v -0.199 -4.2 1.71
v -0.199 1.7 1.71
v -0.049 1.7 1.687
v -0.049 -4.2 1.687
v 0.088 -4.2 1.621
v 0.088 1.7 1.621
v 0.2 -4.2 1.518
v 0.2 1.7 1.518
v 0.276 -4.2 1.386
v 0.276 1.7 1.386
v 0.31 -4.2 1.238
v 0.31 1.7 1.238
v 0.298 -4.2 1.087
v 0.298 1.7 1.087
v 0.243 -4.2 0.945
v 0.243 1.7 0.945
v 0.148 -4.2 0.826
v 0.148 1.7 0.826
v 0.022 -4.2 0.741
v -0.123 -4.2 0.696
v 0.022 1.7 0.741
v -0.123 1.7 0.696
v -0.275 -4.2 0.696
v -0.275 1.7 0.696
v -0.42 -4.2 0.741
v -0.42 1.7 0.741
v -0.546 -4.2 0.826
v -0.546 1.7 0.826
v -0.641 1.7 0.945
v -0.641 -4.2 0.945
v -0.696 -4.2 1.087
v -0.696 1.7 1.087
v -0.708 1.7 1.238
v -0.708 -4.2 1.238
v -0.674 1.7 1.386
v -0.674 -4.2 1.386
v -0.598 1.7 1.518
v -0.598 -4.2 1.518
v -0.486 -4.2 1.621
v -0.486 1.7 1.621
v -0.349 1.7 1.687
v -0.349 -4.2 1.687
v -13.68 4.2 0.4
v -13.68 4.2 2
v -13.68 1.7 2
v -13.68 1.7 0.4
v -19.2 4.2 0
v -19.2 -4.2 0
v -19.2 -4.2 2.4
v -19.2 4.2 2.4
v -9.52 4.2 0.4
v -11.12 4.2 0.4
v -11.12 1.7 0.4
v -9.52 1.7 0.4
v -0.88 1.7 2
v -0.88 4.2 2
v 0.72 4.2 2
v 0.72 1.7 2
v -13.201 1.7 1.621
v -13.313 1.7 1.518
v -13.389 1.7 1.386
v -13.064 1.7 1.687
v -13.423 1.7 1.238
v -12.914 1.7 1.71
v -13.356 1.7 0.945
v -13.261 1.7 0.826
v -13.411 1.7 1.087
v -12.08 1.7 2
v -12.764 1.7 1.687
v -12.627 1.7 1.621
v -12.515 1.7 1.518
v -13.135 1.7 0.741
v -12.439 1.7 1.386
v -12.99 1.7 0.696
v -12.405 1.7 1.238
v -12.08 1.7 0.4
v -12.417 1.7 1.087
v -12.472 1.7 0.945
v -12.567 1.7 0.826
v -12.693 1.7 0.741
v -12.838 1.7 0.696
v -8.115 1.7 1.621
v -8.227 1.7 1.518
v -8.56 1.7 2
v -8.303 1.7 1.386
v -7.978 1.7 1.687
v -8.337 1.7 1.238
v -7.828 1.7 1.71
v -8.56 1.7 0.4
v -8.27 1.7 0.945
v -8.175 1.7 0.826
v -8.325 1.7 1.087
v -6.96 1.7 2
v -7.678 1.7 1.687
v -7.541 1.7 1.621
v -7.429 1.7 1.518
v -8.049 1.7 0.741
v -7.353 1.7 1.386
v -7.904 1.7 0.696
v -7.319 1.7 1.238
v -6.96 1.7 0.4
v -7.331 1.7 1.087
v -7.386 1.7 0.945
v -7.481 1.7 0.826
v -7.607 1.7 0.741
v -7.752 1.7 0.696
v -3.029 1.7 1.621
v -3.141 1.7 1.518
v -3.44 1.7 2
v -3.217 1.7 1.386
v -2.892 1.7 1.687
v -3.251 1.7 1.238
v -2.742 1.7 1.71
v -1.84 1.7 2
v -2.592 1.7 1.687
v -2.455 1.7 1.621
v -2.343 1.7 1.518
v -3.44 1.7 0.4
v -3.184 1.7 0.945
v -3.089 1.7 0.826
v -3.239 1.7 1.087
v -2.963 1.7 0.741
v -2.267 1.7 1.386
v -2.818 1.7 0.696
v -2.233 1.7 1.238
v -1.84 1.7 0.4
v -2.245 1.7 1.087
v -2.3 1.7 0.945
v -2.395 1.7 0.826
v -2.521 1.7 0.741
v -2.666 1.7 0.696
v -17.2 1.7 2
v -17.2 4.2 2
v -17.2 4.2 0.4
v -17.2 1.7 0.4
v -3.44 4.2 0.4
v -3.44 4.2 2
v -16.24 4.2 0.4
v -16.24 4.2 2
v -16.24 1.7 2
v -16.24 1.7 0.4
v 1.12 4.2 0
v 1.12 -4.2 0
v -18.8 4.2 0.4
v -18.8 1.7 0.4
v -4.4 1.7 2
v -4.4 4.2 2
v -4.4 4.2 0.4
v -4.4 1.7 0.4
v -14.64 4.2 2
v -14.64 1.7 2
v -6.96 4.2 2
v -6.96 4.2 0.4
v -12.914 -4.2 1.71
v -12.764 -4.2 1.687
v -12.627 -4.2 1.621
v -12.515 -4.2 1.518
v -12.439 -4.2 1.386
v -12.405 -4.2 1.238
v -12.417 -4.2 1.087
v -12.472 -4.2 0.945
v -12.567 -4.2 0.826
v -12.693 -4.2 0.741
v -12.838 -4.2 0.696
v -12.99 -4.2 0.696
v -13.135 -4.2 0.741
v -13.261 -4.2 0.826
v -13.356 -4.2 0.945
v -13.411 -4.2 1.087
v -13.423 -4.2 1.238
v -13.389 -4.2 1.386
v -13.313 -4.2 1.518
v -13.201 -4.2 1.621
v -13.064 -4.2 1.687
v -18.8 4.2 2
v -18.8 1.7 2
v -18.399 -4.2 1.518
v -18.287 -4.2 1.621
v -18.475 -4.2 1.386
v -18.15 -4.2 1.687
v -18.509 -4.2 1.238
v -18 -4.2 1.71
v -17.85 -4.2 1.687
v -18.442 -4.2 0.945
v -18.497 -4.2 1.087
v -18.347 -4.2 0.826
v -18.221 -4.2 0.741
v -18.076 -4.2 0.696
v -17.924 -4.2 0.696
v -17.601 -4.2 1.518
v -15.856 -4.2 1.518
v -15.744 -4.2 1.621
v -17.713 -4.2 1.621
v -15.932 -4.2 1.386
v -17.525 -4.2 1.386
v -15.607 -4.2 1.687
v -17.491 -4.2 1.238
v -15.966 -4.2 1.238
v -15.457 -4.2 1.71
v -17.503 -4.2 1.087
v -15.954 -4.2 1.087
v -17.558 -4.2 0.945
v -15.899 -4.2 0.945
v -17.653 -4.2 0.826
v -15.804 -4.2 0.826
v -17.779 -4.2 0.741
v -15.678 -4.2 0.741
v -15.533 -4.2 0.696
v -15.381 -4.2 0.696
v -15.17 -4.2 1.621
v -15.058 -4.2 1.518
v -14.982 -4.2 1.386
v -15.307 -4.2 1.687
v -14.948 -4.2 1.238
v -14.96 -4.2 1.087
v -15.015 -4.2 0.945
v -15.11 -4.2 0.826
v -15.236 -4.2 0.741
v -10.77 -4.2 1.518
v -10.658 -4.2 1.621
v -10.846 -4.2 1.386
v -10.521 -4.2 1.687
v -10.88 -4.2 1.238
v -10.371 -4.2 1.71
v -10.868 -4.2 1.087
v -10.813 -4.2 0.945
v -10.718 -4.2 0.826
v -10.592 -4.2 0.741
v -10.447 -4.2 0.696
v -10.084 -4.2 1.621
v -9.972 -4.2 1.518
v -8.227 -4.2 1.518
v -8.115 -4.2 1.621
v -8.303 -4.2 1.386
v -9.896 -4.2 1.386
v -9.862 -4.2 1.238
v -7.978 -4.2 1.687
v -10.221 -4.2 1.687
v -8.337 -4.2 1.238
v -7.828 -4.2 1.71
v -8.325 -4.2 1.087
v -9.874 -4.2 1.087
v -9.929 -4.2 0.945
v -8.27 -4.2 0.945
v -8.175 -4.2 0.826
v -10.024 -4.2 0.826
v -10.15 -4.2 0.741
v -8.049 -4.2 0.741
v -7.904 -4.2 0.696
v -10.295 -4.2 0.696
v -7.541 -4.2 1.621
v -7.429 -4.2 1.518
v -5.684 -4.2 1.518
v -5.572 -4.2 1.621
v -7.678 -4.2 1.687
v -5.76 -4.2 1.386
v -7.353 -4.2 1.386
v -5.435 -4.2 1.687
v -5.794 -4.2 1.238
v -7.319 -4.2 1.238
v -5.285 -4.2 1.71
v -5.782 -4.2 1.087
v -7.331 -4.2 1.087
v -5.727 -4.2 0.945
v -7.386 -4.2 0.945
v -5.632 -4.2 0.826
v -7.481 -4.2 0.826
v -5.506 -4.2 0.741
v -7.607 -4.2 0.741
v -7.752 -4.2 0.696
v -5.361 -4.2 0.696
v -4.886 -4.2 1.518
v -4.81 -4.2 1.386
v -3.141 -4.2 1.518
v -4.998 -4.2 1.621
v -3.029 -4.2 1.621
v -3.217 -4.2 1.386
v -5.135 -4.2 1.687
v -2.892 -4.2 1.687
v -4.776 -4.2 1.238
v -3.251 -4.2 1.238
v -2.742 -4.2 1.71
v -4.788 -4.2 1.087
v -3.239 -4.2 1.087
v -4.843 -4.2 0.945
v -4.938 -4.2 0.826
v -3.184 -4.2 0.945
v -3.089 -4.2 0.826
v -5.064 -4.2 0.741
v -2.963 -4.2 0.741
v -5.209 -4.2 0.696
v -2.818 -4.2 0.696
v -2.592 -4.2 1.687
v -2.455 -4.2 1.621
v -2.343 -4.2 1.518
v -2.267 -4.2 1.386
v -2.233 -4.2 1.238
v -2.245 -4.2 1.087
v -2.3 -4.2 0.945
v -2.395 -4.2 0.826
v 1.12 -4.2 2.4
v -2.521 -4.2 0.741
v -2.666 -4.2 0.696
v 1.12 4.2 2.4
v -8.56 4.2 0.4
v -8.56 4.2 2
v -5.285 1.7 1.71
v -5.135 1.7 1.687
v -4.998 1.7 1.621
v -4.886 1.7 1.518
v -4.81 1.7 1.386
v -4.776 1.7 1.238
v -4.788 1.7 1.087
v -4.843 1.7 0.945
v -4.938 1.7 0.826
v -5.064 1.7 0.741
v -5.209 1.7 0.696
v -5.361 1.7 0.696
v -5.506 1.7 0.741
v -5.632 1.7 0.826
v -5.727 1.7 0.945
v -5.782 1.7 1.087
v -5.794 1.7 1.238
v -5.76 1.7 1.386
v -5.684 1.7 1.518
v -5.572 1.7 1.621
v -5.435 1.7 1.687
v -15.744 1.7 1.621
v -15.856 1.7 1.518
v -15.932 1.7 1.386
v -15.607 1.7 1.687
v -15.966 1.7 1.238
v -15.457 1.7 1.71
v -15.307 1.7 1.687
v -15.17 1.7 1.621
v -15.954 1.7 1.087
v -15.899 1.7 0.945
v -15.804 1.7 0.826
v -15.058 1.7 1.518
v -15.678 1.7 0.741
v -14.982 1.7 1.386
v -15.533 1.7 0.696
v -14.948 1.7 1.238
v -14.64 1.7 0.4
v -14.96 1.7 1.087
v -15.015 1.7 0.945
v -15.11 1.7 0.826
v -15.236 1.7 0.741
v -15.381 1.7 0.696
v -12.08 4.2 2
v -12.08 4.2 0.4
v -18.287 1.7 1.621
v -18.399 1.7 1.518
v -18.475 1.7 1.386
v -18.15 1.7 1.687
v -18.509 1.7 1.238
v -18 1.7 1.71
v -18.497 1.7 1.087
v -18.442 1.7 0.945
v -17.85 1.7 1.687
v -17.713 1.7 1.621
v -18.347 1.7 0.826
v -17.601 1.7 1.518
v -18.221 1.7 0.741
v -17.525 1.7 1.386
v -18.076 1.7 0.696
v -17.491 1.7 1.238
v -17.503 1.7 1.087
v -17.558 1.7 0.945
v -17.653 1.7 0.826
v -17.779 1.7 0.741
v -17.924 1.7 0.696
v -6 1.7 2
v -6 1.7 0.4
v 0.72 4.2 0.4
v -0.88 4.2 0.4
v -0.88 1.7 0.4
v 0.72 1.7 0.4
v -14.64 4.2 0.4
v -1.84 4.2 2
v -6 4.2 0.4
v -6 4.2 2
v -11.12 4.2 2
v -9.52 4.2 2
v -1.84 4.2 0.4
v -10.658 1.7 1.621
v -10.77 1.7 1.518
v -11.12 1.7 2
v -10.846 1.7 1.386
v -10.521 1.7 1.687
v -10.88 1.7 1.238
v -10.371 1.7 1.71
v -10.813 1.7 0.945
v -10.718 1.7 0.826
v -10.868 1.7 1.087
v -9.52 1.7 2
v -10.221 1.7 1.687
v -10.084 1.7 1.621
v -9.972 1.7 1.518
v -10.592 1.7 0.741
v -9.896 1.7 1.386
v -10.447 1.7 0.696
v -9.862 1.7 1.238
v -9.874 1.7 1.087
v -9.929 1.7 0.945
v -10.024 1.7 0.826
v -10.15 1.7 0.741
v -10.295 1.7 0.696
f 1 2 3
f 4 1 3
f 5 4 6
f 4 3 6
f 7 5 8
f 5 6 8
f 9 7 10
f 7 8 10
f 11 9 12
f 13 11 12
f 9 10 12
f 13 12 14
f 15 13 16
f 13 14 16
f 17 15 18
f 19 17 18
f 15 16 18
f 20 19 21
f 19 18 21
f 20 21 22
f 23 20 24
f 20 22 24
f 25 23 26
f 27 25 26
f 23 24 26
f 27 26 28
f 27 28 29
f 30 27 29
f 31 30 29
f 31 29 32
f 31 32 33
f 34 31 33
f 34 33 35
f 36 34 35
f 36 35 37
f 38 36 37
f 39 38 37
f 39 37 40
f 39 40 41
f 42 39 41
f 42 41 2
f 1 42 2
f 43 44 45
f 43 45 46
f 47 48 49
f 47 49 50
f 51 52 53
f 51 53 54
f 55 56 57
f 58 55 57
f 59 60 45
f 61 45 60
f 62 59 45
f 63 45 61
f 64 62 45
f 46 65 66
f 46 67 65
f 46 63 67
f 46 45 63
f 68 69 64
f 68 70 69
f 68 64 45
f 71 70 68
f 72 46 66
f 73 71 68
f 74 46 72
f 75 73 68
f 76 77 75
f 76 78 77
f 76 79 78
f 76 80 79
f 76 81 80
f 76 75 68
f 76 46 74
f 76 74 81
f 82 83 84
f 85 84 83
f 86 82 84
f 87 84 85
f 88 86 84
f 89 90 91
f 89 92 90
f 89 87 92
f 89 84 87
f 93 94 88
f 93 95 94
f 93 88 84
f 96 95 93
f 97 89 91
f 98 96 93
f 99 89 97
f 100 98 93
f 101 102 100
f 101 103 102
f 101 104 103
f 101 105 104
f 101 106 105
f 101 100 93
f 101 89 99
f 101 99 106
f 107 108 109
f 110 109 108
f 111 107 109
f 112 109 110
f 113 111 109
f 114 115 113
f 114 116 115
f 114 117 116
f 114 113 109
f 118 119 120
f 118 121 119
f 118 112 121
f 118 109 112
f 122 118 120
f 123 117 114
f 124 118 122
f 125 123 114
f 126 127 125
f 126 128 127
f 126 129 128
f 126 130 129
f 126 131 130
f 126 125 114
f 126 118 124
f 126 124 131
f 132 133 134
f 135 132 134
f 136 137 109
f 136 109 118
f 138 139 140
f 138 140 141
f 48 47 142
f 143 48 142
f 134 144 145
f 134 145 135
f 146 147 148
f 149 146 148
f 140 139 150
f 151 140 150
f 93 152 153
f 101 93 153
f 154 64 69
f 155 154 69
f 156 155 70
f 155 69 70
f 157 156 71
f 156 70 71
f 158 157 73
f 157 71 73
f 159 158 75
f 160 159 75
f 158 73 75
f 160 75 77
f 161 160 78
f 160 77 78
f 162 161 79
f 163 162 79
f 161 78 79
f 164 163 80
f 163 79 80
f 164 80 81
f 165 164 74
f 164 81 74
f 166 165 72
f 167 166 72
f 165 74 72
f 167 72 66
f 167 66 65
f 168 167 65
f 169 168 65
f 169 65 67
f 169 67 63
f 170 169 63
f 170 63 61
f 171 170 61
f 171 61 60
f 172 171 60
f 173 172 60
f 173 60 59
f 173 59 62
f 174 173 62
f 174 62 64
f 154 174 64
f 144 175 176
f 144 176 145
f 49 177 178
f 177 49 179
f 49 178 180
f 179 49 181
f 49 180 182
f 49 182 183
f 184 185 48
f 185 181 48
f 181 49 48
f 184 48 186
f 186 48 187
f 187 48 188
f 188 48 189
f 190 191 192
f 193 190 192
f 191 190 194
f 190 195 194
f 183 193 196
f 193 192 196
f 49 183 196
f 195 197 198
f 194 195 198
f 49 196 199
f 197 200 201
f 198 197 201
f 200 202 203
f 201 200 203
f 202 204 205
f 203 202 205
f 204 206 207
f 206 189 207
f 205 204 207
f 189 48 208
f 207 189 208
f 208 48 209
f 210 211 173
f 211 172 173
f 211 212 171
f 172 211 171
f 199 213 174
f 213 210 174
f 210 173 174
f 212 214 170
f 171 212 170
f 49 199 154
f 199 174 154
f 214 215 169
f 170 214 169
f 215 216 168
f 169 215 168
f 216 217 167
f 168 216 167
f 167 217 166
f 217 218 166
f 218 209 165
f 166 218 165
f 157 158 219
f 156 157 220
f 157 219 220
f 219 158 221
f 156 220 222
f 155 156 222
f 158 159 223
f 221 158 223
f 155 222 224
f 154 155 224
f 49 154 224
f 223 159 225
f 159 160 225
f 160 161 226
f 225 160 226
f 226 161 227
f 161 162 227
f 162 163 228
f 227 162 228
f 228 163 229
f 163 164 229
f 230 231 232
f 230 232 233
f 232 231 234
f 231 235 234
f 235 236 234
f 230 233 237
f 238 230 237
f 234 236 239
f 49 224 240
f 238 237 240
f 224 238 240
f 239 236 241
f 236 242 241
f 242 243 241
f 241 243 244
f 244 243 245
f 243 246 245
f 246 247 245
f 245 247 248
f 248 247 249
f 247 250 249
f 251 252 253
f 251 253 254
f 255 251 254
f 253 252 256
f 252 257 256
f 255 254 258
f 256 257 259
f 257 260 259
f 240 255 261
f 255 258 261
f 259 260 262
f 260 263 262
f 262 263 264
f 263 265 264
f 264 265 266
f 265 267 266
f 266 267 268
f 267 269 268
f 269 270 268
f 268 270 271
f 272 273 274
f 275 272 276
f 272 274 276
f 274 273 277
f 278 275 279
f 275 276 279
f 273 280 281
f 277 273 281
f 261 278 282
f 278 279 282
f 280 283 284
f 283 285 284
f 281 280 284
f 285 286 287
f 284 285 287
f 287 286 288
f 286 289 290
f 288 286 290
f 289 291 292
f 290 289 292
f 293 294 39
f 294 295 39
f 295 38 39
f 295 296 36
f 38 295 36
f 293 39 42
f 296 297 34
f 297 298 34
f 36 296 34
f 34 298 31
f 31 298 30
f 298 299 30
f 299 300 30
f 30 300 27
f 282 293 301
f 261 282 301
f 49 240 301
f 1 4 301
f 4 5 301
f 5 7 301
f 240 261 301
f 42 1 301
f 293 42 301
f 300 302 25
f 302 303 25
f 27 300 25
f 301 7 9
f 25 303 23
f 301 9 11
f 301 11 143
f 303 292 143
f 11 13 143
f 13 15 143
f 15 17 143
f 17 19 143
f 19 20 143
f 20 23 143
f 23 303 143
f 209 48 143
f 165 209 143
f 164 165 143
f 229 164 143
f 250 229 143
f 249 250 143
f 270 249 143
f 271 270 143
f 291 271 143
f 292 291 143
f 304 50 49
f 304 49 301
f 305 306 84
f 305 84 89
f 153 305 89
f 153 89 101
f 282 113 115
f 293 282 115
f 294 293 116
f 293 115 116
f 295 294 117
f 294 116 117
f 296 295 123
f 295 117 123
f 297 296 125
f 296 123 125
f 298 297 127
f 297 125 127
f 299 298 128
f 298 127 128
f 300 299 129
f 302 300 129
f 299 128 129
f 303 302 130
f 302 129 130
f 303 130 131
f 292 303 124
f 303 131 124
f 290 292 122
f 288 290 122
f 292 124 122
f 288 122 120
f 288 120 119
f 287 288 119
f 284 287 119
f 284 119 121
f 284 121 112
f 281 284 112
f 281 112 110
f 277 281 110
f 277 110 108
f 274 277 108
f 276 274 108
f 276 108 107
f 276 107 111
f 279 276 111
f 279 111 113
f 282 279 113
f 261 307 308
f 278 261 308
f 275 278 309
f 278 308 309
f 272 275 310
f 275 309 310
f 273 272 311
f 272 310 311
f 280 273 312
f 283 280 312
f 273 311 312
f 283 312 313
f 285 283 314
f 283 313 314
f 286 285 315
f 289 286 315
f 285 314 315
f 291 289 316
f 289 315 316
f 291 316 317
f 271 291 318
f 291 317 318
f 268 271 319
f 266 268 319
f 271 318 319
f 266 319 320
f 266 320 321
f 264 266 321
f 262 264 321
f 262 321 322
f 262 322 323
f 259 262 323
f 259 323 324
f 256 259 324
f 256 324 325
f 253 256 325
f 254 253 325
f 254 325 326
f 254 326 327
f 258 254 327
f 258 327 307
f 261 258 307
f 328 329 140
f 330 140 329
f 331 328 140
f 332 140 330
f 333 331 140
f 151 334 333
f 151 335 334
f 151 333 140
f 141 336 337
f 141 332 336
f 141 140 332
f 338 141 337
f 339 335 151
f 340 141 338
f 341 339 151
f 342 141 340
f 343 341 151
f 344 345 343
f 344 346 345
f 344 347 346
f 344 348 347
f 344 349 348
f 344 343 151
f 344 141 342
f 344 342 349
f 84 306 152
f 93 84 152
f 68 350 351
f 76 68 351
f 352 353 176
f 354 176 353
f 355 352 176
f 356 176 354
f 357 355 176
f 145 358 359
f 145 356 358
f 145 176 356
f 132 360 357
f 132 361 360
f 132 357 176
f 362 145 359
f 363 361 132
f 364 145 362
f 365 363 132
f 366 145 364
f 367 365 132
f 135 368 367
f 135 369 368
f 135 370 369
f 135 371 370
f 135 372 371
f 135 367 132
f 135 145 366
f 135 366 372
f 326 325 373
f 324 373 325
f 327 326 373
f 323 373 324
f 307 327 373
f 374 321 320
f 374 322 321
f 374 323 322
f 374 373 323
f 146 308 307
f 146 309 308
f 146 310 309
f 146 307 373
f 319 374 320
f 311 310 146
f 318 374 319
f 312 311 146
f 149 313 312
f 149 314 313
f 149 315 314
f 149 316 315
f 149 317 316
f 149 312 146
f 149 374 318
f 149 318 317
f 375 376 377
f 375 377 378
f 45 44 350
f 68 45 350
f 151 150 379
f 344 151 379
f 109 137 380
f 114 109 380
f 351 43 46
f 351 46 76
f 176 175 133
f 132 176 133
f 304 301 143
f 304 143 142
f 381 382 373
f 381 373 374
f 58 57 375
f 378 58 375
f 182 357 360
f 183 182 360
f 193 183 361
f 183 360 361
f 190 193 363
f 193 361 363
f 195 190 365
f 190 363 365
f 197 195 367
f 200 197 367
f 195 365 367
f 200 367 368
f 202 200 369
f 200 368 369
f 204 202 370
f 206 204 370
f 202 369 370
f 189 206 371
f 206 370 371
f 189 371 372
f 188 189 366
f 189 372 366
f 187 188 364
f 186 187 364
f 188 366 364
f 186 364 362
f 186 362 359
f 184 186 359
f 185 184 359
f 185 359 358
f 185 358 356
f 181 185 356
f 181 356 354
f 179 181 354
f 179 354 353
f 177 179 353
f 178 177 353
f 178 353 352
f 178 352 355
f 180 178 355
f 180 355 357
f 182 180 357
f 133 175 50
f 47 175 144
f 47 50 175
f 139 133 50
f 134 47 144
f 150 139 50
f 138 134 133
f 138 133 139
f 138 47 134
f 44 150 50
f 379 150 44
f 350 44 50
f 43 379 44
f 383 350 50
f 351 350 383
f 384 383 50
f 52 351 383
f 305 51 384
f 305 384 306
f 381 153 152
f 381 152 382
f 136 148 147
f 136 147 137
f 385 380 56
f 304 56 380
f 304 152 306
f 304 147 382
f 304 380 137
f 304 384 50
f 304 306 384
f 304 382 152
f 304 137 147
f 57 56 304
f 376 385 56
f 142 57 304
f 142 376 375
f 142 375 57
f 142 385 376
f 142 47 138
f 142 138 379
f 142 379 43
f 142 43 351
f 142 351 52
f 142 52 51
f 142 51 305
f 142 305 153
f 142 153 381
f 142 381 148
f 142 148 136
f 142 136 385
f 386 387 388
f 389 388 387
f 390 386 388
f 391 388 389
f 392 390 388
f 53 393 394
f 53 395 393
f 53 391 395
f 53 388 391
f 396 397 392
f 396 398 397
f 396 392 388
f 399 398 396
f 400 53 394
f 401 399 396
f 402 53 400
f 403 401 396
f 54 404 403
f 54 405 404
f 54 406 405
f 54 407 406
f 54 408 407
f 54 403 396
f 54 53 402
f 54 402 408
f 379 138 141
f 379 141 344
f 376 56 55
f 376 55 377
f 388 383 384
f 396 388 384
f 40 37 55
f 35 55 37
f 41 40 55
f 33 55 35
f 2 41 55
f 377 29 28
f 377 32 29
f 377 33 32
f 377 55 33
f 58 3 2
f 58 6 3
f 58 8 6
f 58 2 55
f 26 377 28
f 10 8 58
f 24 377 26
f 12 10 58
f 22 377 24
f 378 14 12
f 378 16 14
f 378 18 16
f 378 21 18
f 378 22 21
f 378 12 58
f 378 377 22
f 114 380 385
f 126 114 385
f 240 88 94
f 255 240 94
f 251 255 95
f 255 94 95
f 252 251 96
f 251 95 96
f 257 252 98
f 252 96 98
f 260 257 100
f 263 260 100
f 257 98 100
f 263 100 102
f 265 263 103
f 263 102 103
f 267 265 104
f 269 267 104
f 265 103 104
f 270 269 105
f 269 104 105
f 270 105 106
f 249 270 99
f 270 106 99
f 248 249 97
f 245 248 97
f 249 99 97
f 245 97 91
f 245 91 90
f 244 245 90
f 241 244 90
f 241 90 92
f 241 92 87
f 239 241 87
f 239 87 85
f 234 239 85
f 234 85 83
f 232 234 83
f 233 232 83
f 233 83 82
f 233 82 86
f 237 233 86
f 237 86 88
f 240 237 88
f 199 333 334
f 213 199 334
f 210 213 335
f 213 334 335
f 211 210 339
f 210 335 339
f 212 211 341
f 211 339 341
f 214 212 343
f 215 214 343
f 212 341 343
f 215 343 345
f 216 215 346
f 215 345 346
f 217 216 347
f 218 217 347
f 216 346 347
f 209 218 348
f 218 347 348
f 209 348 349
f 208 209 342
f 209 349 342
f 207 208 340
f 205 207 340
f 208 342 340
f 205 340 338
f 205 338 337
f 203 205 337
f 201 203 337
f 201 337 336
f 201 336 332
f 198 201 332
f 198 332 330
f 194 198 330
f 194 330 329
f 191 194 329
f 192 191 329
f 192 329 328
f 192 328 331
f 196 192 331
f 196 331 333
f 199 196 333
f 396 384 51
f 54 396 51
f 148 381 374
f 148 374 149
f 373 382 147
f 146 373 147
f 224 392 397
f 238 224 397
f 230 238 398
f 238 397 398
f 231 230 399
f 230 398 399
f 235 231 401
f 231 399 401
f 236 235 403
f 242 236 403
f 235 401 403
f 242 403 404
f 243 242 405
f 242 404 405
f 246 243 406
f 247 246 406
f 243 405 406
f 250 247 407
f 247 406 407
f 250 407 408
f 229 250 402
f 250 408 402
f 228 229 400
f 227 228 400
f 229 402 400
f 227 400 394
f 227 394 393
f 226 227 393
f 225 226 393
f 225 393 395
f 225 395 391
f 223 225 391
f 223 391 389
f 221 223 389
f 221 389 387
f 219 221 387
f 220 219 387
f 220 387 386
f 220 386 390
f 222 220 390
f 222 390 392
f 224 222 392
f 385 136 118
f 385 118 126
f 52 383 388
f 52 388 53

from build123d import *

# Parameters (mm, degrees)
ESBO_O1_W                = 38.4
ESBO_O1_H                = 8.4
RESSALTO_EXTRUS_O1_DEPTH = 2.4
ESBO_O2_W                = 1.6
ESBO_O2_H                = 1.6
CORTE_EXTRUS_O1_DEPTH    = 2.5
PADR_O_LINEAR1_COUNT     = 16
PADR_O_LINEAR1_PITCH     = 2.56
ESBO_O3_R                = 0.51
CORTE_EXTRUS_O2_DEPTH    = 21.228939666
PADR_O_LINEAR2_COUNT     = 15
PADR_O_LINEAR2_PITCH     = 2.543
ESBO_O6_W                = 18.080220827
ESBO_O6_H                = 8.4
CORTE_EXTRUS_O3_DEPTH    = 10


with BuildPart() as part:
    # Esboço1 → Ressalto-extrusão1 (new body)
    with BuildSketch(Plane.XY):
        Rectangle(ESBO_O1_W, ESBO_O1_H)
    extrude(amount=RESSALTO_EXTRUS_O1_DEPTH)

    # Esboço2 → Corte-extrusão1 (cut)
    with BuildSketch(Plane(origin=(0, 4.2, 0), x_dir=(1, 0, 0), z_dir=(0, 1, 0))):
        with Locations((-18, -1.2)):
            Rectangle(ESBO_O2_W, ESBO_O2_H)
    corte_extrus_o1 = extrude(amount=-CORTE_EXTRUS_O1_DEPTH, mode=Mode.SUBTRACT)

    # Padrão linear1: Corte-extrusão1 ×16
    with Locations(*[(i * PADR_O_LINEAR1_PITCH, 0, 0) for i in range(1, PADR_O_LINEAR1_COUNT)]):
        add(corte_extrus_o1, mode=Mode.SUBTRACT)

    # Esboço3 → Corte-extrusão2 (cut, through all)
    with BuildSketch(Plane(origin=(0, 1.7, 0), x_dir=(1, 0, 0), z_dir=(0, 1, 0))):
        with Locations(Location((-18, -1.2, 0), (0, 0, 270))):
            Circle(ESBO_O3_R)
    corte_extrus_o2 = extrude(amount=-CORTE_EXTRUS_O2_DEPTH, mode=Mode.SUBTRACT)

    # Padrão linear2: Corte-extrusão2 ×15
    with Locations(*[(i * PADR_O_LINEAR2_PITCH, 0, 0) for i in range(1, PADR_O_LINEAR2_COUNT)]):
        add(corte_extrus_o2, mode=Mode.SUBTRACT)

    # Esboço6 → Corte-extrusão3 (cut)
    with BuildSketch(Plane.XY.offset(2.4)):
        with Locations((10.159889587, 0)):
            Rectangle(ESBO_O6_W, ESBO_O6_H)
    extrude(amount=-CORTE_EXTRUS_O3_DEPTH, mode=Mode.SUBTRACT)


solid = part.part
